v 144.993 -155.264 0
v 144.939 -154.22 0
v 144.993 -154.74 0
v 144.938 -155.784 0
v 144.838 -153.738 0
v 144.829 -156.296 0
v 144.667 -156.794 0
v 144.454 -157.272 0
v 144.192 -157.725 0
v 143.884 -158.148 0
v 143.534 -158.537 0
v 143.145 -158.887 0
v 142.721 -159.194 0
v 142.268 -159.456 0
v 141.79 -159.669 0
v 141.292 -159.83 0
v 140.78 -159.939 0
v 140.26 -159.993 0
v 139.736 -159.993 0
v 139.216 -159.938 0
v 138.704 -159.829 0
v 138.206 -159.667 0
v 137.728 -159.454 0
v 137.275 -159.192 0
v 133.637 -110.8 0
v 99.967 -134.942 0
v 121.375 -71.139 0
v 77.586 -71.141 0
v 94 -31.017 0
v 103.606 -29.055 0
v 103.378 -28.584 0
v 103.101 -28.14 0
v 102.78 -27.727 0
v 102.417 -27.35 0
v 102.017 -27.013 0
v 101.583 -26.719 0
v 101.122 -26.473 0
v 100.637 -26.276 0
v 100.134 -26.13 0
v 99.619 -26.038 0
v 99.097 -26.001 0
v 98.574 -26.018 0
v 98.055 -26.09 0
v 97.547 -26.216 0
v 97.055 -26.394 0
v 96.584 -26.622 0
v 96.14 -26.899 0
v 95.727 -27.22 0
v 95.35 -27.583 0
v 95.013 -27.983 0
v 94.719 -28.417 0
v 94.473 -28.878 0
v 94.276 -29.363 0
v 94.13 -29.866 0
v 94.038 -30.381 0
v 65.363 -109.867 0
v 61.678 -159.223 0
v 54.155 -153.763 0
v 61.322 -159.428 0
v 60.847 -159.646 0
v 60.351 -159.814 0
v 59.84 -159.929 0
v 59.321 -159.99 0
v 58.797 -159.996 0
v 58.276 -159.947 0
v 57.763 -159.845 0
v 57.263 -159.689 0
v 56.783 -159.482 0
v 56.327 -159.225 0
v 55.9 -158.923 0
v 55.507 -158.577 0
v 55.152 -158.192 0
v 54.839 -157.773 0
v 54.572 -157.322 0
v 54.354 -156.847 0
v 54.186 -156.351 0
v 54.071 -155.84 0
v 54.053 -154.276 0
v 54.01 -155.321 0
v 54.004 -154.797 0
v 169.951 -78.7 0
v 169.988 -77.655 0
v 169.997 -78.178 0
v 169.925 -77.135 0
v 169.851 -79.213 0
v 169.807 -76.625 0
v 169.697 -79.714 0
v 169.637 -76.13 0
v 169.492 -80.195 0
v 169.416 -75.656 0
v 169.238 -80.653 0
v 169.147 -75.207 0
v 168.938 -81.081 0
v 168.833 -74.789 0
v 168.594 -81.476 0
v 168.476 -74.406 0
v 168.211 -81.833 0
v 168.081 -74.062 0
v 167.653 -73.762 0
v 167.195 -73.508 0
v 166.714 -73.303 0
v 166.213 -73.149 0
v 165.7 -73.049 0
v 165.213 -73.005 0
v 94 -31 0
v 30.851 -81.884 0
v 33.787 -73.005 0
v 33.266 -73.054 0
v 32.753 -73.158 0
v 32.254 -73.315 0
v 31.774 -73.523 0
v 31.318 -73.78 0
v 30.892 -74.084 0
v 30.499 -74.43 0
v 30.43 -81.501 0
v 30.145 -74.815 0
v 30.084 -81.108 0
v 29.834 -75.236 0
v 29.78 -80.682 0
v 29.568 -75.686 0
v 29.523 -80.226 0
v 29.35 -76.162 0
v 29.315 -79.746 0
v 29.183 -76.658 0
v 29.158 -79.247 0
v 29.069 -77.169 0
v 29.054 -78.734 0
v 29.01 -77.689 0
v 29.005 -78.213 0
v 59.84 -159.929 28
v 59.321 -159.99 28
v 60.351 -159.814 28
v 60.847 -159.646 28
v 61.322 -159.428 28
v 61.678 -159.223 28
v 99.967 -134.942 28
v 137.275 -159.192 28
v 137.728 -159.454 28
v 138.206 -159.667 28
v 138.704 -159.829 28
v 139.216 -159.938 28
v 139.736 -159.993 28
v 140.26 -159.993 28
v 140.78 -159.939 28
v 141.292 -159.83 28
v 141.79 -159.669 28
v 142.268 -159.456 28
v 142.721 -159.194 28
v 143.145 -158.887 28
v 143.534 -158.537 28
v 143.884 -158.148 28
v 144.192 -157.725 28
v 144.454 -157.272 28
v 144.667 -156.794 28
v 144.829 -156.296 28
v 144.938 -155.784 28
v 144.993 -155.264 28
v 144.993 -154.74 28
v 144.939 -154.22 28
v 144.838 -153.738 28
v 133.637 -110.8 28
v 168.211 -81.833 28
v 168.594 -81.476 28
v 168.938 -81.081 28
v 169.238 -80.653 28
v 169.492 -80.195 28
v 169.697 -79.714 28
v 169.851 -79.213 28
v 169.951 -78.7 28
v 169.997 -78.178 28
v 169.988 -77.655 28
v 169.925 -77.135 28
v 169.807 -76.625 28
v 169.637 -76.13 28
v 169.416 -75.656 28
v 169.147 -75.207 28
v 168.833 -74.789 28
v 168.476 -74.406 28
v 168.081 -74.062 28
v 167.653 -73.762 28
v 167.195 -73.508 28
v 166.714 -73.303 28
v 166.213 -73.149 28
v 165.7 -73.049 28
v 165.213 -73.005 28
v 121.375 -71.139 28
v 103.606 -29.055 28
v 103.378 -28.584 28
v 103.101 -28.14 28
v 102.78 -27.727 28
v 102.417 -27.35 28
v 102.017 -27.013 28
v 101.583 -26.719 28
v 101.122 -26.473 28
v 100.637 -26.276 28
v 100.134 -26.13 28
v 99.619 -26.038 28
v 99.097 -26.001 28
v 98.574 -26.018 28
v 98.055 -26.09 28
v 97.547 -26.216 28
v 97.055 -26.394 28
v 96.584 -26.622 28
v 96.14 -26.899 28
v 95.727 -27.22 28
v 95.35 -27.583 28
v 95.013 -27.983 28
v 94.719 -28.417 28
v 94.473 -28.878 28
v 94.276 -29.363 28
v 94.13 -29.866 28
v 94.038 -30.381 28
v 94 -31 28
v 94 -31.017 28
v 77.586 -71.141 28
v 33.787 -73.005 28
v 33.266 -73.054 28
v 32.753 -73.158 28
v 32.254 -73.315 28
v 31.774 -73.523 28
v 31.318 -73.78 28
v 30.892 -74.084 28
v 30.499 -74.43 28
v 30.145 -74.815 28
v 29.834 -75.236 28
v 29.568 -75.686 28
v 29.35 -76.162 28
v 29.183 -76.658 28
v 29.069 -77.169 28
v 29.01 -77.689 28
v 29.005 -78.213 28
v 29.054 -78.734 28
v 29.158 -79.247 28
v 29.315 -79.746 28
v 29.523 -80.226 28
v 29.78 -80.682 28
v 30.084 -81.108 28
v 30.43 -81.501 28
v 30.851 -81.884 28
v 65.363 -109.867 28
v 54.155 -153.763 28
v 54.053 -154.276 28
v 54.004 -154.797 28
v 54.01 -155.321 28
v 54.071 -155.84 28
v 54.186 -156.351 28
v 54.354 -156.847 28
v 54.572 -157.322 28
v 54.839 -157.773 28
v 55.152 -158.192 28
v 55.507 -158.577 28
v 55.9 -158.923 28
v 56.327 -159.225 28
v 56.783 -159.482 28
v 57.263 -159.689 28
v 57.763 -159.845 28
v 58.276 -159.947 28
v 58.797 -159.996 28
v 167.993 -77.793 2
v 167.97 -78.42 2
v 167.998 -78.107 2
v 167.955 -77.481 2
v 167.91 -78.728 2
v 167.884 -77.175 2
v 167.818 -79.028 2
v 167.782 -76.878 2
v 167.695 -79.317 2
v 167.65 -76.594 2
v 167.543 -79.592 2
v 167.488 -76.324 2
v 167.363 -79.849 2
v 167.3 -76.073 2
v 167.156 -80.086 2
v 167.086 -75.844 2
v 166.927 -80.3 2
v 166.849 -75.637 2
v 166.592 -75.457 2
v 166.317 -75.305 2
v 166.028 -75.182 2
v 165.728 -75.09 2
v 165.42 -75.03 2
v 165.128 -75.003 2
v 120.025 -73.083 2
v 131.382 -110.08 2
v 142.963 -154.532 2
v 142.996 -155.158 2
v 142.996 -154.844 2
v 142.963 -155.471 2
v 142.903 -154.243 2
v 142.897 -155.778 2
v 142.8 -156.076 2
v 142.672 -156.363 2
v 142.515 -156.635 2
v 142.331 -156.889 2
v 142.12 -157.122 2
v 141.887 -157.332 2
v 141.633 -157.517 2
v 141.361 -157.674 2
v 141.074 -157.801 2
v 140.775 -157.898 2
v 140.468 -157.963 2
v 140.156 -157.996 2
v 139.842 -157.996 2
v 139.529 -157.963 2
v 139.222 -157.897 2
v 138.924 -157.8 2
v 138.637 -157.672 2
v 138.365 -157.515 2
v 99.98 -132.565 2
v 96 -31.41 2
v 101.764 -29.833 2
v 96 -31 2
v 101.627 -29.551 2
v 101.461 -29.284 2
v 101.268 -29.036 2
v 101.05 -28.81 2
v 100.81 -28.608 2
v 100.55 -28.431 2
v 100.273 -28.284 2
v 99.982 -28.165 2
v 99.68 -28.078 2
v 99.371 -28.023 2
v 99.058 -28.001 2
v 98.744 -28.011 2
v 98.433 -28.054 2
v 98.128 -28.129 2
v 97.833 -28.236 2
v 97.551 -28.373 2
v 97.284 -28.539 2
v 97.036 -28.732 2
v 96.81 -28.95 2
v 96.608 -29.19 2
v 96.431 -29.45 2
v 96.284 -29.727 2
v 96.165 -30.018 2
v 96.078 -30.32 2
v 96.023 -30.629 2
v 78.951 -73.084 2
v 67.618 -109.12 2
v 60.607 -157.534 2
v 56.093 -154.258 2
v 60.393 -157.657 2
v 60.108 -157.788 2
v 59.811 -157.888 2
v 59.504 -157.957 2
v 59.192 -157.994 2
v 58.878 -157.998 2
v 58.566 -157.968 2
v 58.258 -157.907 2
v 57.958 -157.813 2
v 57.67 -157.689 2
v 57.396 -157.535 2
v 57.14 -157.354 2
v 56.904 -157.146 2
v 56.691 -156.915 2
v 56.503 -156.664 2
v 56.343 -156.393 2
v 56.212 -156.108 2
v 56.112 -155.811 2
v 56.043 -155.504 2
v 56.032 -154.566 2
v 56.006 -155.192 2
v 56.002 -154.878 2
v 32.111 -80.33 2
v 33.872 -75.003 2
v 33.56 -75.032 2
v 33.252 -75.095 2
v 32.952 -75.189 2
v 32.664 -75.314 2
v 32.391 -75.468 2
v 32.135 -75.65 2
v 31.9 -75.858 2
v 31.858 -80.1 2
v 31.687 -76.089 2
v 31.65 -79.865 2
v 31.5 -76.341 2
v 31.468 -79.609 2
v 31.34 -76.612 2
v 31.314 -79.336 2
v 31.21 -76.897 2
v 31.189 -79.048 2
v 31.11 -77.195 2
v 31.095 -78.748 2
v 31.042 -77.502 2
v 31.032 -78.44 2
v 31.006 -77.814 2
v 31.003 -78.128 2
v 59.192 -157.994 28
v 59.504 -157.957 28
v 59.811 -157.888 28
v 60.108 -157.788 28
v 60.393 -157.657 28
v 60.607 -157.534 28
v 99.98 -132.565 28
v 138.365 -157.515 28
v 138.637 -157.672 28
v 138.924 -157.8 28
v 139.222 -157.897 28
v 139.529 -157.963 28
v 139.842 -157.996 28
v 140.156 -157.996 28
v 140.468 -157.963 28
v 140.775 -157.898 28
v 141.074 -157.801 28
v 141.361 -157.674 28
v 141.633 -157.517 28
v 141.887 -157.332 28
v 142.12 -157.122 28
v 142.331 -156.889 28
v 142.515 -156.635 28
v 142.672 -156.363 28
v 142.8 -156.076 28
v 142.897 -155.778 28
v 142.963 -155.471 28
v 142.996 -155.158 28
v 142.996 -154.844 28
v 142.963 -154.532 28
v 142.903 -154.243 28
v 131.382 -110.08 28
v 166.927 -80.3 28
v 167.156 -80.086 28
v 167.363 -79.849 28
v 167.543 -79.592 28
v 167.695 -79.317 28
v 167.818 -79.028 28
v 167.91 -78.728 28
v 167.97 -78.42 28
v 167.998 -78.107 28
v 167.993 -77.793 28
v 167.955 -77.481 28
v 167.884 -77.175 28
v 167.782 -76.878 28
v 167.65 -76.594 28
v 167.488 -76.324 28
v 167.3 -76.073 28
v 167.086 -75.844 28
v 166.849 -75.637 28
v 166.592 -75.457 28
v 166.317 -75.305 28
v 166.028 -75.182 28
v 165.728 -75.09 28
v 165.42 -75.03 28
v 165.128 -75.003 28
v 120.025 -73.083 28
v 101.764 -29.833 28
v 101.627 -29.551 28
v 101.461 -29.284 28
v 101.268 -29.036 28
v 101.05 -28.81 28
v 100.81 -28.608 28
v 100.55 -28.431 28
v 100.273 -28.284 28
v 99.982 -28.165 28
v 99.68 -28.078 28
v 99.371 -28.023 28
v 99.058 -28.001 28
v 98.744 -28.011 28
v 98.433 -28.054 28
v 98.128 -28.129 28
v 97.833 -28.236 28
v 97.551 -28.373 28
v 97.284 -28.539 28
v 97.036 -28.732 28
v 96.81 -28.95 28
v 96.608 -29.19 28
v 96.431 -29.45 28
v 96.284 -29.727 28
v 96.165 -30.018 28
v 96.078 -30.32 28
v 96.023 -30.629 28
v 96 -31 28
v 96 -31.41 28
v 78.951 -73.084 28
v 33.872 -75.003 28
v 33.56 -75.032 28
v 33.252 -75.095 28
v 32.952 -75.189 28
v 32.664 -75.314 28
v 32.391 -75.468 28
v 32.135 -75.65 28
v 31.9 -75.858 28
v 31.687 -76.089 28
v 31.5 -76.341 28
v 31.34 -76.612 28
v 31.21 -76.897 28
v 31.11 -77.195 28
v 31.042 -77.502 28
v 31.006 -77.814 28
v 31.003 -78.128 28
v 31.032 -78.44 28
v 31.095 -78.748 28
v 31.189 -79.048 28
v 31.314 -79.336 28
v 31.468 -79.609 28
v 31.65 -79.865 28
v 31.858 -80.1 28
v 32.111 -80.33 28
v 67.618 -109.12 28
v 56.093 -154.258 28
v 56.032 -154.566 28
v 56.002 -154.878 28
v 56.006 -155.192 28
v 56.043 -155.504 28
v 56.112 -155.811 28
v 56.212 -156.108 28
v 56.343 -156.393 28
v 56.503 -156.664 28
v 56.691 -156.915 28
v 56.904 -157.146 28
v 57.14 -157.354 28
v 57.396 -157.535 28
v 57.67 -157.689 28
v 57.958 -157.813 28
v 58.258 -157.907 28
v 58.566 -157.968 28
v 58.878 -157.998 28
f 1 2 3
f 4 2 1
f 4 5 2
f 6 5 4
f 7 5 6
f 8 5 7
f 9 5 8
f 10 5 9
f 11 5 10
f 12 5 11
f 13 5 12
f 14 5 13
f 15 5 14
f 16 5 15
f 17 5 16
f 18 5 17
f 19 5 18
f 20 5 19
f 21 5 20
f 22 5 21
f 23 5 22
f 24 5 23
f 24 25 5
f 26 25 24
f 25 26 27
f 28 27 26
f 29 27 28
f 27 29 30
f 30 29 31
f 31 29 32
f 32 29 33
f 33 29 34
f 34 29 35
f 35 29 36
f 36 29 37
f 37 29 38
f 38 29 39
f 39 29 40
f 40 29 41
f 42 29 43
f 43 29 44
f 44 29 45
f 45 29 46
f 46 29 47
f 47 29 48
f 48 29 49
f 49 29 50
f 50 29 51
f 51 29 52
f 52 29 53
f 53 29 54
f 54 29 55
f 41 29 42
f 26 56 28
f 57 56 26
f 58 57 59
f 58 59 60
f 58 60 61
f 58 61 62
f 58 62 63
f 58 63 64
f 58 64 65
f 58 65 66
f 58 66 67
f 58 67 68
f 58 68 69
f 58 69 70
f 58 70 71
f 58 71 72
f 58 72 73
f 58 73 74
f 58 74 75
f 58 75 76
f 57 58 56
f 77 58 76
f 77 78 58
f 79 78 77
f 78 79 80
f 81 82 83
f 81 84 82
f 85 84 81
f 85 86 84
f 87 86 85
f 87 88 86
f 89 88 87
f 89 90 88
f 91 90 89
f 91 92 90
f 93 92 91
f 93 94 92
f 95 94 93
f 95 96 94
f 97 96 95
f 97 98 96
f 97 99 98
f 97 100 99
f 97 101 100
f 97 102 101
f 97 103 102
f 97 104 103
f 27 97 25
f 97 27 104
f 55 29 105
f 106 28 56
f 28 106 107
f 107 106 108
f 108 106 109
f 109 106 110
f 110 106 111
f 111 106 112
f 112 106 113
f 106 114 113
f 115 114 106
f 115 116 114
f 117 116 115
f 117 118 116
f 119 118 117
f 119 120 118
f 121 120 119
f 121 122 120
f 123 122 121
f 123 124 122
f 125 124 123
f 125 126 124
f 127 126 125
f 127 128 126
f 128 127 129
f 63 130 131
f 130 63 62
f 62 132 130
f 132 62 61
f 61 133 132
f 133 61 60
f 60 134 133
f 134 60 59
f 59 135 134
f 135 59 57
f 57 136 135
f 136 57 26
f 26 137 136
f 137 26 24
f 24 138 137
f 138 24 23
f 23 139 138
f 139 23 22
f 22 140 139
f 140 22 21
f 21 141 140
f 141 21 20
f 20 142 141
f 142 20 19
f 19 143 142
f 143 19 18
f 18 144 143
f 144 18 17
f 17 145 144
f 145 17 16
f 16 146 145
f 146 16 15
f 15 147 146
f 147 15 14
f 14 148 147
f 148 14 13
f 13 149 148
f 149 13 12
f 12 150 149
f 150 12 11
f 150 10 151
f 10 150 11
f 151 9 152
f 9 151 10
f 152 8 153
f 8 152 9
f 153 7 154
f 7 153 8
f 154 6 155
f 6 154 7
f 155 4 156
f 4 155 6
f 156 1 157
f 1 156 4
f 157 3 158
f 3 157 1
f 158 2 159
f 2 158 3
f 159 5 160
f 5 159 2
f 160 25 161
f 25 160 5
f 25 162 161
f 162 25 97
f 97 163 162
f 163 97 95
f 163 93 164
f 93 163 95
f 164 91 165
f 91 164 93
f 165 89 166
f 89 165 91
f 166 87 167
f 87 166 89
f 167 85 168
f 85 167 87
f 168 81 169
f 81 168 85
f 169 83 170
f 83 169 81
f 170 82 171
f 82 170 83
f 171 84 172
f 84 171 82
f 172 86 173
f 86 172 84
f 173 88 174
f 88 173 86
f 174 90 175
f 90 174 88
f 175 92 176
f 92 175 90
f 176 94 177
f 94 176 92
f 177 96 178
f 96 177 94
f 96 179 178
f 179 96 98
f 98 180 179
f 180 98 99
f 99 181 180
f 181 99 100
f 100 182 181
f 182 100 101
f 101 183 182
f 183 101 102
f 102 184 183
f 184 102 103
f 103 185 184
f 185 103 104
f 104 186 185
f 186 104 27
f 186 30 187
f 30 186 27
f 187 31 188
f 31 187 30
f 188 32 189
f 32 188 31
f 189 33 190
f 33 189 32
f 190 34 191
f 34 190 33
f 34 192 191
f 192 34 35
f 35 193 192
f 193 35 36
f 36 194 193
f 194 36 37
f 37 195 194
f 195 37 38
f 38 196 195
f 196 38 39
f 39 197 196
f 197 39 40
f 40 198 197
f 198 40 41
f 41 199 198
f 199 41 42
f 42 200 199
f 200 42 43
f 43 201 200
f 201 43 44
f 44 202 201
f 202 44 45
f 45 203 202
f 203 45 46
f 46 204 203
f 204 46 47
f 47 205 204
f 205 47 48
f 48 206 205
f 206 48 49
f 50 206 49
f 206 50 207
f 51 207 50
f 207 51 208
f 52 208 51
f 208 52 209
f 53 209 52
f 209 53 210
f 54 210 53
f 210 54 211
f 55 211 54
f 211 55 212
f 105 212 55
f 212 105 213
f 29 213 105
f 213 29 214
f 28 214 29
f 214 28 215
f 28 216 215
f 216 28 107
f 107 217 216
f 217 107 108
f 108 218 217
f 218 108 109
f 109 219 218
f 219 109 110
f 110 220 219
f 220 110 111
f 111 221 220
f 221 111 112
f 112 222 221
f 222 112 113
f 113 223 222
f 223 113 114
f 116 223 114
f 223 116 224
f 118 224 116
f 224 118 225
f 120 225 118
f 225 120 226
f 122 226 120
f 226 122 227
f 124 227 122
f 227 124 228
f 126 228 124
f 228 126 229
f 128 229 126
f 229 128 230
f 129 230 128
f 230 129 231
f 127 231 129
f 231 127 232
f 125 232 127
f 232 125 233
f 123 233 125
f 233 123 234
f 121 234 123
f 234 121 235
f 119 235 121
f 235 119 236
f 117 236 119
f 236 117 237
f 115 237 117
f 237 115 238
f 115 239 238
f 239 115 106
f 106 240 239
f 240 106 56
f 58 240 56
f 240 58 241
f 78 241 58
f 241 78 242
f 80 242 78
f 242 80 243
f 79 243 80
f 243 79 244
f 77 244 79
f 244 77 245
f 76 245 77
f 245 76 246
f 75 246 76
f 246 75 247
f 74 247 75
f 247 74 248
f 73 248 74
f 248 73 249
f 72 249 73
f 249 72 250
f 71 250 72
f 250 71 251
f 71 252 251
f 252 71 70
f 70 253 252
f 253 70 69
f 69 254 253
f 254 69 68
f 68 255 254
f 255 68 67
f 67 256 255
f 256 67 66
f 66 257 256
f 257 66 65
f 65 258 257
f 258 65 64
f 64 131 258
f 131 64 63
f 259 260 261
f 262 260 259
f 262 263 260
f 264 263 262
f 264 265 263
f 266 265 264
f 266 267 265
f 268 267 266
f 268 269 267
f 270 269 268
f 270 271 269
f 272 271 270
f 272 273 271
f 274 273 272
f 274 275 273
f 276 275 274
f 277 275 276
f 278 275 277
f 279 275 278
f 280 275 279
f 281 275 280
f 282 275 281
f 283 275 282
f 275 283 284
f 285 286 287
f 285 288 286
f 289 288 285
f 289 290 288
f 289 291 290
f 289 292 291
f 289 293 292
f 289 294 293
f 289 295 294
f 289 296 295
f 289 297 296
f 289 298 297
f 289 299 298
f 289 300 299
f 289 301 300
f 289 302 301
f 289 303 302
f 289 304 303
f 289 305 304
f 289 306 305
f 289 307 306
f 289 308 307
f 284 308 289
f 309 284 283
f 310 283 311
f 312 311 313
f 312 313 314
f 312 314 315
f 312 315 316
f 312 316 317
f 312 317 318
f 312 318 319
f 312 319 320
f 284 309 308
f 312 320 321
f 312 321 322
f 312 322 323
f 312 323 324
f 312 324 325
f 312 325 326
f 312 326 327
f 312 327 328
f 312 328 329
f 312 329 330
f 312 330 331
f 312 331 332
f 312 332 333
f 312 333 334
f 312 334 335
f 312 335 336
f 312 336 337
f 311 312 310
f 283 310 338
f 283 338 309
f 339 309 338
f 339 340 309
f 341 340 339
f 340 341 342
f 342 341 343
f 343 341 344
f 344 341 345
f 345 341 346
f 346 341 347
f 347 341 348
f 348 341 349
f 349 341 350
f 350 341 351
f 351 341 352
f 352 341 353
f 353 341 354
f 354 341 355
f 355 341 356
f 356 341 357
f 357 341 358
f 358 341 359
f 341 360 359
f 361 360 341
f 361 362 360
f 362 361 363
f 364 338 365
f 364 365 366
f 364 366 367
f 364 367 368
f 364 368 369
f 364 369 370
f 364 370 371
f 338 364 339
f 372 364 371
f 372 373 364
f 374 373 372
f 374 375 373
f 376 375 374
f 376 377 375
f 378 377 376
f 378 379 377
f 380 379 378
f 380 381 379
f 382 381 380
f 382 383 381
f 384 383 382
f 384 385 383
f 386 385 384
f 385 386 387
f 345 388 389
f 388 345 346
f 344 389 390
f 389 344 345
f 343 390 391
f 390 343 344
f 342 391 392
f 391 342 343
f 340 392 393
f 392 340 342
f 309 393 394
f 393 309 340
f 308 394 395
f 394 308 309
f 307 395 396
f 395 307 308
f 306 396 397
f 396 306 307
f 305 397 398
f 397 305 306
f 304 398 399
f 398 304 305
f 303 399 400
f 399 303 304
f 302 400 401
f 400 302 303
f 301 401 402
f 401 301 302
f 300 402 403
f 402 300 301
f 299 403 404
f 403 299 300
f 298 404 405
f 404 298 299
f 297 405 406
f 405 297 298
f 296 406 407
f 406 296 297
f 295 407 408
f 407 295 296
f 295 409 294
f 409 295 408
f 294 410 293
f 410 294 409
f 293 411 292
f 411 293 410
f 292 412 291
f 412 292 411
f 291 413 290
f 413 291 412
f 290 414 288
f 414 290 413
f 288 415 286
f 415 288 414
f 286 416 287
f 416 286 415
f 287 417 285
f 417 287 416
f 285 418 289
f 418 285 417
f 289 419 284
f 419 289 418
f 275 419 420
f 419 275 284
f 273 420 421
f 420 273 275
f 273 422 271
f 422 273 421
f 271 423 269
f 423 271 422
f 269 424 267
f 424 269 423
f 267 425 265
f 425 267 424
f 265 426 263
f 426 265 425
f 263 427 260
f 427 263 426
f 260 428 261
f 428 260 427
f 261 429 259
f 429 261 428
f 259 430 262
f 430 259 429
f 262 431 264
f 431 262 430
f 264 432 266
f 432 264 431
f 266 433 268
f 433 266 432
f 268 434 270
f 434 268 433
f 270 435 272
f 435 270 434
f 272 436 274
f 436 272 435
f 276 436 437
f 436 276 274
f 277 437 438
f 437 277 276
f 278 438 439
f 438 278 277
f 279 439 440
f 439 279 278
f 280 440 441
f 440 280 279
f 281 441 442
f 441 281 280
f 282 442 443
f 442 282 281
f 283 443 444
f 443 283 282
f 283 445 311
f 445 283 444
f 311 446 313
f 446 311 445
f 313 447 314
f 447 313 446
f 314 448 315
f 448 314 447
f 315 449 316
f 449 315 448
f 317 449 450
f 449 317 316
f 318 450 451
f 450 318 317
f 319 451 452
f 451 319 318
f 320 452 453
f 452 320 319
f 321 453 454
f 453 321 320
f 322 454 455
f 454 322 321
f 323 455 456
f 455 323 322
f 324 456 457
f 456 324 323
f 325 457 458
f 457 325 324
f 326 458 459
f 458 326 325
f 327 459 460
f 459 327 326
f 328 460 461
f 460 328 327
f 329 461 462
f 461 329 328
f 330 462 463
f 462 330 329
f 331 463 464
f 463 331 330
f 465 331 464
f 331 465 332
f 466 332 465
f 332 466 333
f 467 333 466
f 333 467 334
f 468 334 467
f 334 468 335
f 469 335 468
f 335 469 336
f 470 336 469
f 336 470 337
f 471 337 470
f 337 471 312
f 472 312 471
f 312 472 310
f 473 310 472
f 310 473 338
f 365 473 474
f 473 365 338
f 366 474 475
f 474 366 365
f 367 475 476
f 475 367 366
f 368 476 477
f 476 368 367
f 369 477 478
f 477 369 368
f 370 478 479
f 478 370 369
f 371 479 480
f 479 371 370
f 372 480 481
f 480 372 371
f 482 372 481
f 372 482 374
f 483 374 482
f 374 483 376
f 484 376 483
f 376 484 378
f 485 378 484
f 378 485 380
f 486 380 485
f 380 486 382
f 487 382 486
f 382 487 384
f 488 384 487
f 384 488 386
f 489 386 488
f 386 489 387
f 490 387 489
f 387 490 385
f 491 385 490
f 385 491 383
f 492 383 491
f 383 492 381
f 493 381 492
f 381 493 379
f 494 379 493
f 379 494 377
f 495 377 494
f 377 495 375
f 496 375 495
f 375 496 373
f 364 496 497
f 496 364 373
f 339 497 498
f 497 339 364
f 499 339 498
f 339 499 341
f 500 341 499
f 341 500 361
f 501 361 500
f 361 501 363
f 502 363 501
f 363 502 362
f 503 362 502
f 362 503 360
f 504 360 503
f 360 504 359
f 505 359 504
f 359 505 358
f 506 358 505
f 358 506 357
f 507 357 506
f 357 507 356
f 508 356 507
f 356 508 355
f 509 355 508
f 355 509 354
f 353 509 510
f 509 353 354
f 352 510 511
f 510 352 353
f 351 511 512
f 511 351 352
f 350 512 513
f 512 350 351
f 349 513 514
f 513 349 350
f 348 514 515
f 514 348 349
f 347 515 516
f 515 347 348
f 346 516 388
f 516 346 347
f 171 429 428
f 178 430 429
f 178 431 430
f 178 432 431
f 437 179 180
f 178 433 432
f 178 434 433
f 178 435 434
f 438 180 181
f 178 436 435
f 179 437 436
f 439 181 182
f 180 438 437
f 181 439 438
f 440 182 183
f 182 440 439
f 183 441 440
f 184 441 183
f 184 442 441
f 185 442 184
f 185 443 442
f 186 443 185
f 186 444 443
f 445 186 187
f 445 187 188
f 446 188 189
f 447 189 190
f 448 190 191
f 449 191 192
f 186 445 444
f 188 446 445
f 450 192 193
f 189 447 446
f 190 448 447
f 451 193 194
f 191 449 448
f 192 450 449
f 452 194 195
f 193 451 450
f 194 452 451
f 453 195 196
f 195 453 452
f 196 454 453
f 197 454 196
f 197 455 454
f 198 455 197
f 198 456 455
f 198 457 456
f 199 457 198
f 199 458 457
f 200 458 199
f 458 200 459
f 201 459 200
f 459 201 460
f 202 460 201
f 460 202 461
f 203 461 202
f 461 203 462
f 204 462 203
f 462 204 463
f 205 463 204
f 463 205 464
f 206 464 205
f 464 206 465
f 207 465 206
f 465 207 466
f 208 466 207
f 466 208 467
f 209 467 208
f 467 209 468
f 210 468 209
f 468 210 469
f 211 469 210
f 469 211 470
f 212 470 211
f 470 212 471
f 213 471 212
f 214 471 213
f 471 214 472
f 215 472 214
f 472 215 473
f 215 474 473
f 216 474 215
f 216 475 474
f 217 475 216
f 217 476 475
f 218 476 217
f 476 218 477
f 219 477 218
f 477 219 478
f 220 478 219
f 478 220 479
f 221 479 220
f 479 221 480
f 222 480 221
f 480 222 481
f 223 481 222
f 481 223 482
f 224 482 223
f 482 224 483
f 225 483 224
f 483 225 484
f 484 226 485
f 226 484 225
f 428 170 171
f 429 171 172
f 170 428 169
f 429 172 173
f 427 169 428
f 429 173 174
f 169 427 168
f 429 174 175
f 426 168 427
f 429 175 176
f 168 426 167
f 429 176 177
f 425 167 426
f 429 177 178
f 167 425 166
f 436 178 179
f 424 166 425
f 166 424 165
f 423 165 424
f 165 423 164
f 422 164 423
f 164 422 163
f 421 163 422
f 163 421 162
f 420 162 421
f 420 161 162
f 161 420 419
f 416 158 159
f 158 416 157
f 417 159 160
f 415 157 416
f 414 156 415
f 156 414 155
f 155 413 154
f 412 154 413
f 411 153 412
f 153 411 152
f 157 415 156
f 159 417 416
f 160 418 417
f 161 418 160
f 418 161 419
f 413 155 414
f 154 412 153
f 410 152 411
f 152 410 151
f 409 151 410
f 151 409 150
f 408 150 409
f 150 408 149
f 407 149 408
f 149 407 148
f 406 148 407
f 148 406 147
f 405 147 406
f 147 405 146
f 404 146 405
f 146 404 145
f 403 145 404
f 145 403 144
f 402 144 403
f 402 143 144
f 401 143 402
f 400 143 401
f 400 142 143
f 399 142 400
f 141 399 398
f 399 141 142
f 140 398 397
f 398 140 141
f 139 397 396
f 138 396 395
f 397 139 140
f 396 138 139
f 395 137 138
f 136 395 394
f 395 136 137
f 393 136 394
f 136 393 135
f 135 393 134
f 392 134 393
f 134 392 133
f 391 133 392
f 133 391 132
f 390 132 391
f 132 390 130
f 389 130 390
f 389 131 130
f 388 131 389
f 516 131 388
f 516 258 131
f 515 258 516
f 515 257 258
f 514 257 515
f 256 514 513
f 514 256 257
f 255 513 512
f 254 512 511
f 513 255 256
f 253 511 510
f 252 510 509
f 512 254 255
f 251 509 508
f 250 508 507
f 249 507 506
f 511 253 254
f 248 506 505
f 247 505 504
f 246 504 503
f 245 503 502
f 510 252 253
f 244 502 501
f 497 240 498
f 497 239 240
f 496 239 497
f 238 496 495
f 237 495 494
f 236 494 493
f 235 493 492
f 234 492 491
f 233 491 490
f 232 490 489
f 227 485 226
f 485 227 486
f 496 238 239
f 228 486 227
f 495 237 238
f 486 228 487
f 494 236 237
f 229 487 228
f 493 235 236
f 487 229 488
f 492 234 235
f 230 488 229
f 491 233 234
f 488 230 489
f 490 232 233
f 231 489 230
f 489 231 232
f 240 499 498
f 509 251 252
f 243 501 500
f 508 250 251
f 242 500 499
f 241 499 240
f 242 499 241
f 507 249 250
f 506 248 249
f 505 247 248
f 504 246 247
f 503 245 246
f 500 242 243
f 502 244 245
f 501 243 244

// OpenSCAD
// AUTOMATICALLY GENERATED BY SCOTT ENGINE (Node.js)
// Source: test_star.png
// Points: 11
$fn = 60;

// --- Configuration ---
Render_Mode = "Body"; // Options: "Body", "Lid"
Sign_Height = 30;
Wall_Thickness = 2;
Base_Thickness = 2;
Lid_Tolerance = 0.15;

// -- Engineering Constants --
CW = ("silicone_neon_6mm" == "silicone_neon_6mm") ? 6.0 : 8.0; 
Lip_Overhang = 0.4;

module core_shape() {
    // Scott-Peucker Optimized Vector Path
    polygon(points=[[99,-31],[118,-76],[165,-78],[128,-109],[140,-155],[100,-129],[59,-155],[71,-108],[34,-78],[81,-76],[99,-32]]);
}

module body_geometry() {
    difference() {
        linear_extrude(Sign_Height) offset(r = CW/2 + Wall_Thickness) core_shape();
        translate([0, 0, Base_Thickness]) linear_extrude(Sign_Height + 1) offset(r = CW/2) core_shape();
        
        // Friction Lip for Snap-Fit
        translate([0, 0, Sign_Height - 2.0]) linear_extrude(3.0)
            difference() {
                offset(r = CW/2 + 5) core_shape();
                offset(r = CW/2 - Lip_Overhang) core_shape();
            }
    }
}

module lid_geometry() {
    linear_extrude(2.0) offset(r = (CW/2 + 1.5) - Lid_Tolerance) core_shape();
}

if (Render_Mode == "Body") { body_geometry(); }
else { lid_geometry(); }
